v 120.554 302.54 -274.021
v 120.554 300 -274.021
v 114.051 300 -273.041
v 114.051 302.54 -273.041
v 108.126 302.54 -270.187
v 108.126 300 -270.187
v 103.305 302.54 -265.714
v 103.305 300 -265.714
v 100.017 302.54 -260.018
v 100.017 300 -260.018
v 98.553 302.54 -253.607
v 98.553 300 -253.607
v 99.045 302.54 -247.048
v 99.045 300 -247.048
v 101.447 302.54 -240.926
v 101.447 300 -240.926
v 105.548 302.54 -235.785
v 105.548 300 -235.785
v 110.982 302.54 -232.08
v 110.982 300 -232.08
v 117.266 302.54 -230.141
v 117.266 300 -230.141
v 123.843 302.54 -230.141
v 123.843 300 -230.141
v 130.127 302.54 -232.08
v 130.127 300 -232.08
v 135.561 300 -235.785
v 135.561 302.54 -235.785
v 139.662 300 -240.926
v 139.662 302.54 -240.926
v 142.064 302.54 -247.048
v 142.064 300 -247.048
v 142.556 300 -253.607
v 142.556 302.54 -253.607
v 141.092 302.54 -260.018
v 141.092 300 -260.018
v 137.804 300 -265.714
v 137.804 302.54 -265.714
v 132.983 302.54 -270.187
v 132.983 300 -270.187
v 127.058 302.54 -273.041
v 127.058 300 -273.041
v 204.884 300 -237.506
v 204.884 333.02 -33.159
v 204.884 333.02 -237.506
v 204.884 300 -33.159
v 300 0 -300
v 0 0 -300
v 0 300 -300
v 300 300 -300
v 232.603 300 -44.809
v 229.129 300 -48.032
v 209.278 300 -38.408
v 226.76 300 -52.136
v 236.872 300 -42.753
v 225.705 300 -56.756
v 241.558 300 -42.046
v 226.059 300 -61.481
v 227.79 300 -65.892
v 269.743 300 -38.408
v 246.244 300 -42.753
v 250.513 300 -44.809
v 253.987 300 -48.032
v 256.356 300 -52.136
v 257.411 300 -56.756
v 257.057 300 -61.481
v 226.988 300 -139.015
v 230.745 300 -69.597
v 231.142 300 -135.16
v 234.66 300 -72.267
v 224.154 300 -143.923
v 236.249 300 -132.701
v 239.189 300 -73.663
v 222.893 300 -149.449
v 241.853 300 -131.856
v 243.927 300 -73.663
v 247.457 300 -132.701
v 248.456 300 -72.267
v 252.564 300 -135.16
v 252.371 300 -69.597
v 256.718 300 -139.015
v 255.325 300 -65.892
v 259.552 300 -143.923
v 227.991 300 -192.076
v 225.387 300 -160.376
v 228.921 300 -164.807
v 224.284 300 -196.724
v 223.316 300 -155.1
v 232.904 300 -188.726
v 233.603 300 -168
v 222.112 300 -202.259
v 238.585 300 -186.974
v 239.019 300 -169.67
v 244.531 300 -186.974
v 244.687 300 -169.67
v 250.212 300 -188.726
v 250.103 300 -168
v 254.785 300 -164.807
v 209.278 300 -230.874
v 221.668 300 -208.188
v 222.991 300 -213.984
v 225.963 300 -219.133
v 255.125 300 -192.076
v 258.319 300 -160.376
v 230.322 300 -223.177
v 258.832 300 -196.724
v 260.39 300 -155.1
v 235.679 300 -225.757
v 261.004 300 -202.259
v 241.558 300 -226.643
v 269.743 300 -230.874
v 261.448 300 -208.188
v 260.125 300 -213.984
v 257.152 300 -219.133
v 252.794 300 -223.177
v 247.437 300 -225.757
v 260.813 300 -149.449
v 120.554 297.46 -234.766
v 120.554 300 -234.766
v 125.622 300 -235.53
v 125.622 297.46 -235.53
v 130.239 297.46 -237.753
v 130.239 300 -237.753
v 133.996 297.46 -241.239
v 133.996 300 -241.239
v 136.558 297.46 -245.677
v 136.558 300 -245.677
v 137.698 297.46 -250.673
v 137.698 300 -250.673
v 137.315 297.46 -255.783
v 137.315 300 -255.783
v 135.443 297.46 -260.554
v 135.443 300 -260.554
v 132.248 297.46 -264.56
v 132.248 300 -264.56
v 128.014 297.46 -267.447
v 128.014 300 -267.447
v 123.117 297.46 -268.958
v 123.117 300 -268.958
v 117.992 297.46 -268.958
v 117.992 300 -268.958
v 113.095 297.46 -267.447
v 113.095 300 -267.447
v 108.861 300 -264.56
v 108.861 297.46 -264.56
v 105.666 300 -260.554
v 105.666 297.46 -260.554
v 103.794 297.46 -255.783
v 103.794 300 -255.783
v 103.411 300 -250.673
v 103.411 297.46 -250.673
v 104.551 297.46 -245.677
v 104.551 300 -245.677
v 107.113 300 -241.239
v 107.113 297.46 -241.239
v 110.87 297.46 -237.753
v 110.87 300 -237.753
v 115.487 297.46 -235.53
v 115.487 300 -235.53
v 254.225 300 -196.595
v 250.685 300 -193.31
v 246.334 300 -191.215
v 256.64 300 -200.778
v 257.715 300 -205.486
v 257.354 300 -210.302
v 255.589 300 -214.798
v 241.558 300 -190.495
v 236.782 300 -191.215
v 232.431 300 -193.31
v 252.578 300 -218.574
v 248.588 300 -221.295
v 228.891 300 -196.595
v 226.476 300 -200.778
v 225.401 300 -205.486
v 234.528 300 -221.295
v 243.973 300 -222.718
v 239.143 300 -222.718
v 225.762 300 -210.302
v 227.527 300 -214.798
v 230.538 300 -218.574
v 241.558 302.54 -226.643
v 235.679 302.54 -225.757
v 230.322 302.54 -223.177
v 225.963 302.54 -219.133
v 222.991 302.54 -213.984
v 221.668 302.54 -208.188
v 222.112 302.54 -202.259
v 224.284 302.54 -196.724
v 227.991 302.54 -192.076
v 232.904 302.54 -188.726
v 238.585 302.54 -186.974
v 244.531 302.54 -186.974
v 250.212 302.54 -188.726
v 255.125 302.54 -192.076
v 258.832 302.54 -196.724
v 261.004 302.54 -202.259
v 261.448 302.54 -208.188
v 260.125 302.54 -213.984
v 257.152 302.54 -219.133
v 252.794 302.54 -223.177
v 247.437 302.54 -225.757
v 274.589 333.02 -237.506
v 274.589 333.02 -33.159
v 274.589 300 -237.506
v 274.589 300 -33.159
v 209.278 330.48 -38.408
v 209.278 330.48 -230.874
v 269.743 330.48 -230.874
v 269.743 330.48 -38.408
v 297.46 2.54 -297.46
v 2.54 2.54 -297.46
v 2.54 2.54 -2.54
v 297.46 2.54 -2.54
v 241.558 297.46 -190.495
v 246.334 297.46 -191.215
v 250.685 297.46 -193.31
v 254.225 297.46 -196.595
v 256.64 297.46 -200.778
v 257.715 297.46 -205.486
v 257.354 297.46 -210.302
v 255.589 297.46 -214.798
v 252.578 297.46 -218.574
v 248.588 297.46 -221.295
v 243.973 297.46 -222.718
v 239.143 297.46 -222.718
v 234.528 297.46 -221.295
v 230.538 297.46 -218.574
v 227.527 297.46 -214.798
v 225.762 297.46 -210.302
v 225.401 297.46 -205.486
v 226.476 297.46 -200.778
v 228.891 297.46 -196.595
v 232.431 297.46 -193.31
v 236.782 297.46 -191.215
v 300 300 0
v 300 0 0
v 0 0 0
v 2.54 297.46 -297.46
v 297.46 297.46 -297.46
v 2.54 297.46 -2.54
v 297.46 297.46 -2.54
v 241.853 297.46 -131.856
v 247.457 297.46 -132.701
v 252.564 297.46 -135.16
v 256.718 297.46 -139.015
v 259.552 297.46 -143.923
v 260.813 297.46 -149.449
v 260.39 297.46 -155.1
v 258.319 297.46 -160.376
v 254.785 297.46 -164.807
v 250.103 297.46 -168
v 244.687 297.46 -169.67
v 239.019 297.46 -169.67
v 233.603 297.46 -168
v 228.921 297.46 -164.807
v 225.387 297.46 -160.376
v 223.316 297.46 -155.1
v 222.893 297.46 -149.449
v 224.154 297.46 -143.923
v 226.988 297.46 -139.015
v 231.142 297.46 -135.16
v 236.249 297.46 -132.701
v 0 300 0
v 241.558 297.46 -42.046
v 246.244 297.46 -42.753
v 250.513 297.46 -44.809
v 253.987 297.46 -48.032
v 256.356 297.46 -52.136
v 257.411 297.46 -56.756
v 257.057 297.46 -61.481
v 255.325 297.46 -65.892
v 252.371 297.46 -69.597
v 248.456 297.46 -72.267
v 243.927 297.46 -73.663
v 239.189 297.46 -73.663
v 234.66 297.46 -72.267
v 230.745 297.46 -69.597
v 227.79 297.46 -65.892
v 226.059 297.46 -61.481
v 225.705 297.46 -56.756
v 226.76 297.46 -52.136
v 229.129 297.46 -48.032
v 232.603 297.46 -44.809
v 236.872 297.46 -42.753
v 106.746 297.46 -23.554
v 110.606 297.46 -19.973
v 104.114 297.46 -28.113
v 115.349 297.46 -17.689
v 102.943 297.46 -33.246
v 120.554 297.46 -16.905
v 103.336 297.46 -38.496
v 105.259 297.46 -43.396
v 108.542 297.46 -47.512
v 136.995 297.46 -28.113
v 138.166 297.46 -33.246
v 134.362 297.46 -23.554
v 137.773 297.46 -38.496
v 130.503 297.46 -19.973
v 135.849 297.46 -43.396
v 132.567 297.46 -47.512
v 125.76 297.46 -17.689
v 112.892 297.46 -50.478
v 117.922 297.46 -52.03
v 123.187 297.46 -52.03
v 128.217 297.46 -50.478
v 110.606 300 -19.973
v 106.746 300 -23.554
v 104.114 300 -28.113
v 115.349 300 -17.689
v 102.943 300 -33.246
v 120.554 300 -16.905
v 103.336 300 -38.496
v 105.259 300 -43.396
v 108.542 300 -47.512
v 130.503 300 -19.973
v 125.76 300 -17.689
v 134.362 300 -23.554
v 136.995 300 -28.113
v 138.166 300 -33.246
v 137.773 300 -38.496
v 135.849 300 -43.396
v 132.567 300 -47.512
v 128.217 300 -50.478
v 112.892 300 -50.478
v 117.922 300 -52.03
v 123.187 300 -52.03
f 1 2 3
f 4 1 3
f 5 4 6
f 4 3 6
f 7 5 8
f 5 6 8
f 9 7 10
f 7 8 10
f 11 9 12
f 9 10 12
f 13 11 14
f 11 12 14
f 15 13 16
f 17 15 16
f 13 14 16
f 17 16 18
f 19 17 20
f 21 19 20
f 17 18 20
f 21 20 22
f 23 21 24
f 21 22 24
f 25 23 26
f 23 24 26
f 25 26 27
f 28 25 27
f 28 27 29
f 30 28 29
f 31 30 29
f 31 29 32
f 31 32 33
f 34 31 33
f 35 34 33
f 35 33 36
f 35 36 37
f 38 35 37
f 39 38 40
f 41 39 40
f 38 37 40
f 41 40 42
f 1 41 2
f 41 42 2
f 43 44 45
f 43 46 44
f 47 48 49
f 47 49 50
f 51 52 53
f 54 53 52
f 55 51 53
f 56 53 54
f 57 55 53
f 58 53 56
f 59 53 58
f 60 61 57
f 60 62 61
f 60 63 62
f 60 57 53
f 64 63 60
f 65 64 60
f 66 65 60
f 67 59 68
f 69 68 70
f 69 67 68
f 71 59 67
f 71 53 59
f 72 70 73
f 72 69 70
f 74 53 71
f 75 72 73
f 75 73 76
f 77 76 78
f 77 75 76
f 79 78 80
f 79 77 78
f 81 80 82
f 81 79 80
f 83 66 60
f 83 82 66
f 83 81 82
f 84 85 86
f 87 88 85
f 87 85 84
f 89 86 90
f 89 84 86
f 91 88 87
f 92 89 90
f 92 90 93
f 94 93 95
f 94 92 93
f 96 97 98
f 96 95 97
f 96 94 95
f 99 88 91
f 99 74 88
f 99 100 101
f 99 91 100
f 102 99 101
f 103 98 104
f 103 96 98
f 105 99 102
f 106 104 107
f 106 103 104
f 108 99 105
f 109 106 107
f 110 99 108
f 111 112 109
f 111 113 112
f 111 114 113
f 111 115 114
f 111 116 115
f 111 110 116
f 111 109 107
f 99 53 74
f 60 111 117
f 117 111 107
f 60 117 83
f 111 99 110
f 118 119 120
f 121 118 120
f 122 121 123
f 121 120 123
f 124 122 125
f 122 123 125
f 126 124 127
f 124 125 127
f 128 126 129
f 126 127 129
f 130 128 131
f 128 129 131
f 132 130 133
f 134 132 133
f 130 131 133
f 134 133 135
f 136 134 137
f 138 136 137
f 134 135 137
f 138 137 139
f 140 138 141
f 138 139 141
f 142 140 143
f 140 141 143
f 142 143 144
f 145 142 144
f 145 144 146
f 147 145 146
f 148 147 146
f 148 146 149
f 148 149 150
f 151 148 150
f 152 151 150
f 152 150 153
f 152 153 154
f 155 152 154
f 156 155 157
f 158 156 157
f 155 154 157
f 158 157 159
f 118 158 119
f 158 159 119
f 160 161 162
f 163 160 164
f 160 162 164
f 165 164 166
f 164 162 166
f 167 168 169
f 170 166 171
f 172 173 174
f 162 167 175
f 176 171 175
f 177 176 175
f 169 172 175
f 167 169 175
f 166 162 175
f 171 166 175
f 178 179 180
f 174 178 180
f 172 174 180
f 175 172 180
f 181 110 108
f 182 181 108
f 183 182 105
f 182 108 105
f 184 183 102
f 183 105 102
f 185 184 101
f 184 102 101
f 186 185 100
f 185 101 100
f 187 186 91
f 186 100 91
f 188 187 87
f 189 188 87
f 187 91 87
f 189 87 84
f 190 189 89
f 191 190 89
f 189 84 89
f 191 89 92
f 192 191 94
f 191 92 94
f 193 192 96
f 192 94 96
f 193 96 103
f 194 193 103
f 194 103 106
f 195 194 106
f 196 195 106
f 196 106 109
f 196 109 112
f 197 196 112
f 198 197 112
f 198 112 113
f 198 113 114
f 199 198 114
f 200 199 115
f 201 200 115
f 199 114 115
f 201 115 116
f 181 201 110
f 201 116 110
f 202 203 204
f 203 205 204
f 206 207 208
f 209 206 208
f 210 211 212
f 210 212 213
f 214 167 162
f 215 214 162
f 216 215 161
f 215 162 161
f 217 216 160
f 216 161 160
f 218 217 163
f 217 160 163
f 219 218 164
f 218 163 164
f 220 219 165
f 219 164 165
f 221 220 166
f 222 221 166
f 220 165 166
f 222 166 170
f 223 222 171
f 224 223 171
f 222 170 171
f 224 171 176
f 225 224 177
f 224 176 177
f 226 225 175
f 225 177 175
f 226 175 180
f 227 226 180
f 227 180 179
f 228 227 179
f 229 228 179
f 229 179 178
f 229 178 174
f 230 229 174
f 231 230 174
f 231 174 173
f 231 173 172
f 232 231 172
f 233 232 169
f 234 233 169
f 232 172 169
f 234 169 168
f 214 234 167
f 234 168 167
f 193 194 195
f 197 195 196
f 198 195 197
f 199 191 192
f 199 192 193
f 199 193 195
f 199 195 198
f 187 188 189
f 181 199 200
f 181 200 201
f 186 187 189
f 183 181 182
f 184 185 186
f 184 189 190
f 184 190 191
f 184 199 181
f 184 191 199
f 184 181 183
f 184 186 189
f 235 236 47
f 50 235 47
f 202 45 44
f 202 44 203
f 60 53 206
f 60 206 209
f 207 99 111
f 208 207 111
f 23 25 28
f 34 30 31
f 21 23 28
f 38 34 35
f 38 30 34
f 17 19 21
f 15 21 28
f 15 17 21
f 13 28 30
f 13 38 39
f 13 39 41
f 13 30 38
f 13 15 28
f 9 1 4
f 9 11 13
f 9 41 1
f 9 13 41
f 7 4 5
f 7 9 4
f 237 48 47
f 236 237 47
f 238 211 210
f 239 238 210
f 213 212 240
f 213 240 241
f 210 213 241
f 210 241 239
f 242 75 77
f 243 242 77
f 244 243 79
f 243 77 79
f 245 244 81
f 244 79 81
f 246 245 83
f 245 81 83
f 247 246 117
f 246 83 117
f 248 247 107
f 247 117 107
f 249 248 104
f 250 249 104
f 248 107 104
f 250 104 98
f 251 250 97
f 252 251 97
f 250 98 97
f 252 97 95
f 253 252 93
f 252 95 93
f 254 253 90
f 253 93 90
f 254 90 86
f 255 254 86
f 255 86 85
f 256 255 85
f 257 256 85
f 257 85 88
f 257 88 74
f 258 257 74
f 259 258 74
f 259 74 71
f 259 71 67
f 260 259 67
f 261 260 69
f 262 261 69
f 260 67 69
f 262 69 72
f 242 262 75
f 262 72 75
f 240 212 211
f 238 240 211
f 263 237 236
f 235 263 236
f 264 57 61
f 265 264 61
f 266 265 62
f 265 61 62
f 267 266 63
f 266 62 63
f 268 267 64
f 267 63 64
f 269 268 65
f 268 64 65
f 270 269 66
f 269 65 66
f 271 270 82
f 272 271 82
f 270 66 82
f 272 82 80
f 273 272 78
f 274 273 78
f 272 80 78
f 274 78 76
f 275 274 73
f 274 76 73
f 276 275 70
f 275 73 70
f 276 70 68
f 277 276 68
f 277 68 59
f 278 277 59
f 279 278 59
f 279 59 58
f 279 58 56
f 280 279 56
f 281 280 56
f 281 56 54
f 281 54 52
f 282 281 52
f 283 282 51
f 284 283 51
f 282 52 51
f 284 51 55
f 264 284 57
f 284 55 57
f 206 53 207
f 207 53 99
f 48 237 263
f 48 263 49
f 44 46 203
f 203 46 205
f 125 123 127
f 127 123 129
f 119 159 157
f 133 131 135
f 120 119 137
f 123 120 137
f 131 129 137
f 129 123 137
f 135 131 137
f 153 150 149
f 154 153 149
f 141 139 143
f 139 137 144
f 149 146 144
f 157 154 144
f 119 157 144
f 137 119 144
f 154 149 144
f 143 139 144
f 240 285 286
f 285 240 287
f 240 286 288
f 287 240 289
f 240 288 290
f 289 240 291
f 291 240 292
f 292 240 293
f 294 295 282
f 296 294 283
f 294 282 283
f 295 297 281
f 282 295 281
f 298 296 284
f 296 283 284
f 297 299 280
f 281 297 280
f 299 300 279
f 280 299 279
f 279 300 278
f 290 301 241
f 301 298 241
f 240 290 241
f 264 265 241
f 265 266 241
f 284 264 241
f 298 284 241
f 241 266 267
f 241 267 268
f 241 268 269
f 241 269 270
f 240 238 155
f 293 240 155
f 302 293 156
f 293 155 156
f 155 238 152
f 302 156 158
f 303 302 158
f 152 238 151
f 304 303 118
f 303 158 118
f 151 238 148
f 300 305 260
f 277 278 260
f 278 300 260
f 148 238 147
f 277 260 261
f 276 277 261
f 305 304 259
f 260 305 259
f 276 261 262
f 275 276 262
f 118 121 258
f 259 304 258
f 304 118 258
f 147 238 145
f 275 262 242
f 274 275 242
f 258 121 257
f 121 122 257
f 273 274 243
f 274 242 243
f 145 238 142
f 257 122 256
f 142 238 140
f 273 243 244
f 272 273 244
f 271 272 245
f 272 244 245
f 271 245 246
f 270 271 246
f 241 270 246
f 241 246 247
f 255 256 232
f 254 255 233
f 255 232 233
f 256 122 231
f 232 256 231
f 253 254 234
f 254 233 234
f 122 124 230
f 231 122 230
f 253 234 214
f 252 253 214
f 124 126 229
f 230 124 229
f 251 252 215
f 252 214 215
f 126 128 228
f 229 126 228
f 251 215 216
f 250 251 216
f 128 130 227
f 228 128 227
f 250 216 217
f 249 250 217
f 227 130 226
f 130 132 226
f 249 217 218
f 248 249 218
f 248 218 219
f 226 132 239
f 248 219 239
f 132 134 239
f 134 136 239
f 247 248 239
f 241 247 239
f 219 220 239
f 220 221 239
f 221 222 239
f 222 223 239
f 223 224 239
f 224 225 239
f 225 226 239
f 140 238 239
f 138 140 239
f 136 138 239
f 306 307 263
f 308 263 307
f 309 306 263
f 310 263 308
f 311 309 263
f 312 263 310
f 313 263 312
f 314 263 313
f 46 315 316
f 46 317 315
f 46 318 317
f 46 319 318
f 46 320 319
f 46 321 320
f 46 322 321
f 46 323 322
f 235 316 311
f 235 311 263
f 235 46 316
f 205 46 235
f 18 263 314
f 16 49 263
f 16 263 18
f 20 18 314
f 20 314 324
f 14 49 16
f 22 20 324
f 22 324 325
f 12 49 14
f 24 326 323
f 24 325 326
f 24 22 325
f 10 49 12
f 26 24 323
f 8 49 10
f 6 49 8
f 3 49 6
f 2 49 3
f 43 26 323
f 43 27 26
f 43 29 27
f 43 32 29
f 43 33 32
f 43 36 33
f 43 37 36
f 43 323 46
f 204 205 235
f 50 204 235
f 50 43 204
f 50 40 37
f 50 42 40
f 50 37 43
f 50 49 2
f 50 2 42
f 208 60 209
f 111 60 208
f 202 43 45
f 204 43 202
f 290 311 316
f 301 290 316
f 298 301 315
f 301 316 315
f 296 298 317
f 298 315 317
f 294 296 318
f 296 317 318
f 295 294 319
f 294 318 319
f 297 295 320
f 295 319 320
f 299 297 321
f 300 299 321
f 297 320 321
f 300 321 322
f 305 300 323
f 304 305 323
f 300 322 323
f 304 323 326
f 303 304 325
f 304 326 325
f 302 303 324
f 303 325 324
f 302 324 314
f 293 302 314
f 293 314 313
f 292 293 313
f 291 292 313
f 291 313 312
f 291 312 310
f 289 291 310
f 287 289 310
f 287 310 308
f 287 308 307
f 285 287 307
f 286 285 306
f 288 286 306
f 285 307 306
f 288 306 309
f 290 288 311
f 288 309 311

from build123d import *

# Parameters (mm, degrees)
SKETCH1_W           = 300
SKETCH1_H           = 300
BOSS_EXTRUDE1_DEPTH = 300
SHELL1_T            = -2.54
SKETCH2_W           = 300
SKETCH2_H           = 300
BOSS_EXTRUDE2_DEPTH = 2.54
SKETCH3_R           = 15.897271206
SKETCH3_R_2         = 16.201962057
SKETCH3_R_3         = 17.191821314
SKETCH3_R_4         = 17.661116969
CUT_EXTRUDE1_DEPTH  = 2.54
SKETCH4_R           = 22.06299853
SKETCH4_R_2         = 19.946075444
BOSS_EXTRUDE3_DEPTH = 2.54
SKETCH5_R           = 19.013382907
CUT_EXTRUDE2_DEPTH  = 2.54
SKETCH6_W           = 69.704124702
SKETCH6_H           = 204.3475123
SKETCH6_W_2         = 60.465312628
SKETCH6_H_2         = 192.466149128
BOSS_EXTRUDE4_DEPTH = 30.48
SKETCH7_W           = 69.704124702
SKETCH7_H           = 204.3475123
BOSS_EXTRUDE5_DEPTH = 2.54


with BuildPart() as part:
    # Sketch1 → Boss-Extrude1 (new body)
    with BuildSketch(Plane(origin=(0, 0, 0), x_dir=(1, 0, 0), z_dir=(0, 1, 0))):
        with Locations((150, 150)):
            Rectangle(SKETCH1_W, SKETCH1_H)
    extrude(amount=BOSS_EXTRUDE1_DEPTH)

    # Shell1
    shell1_openings = [part.faces().sort_by_distance(p)[0] for p in [
        (150, 300, -150),
    ]]
    offset(amount=SHELL1_T, openings=shell1_openings, kind=Kind.INTERSECTION)

    # Sketch2 → Boss-Extrude2 (add)
    with BuildSketch(Plane(origin=(0, 300, 0), x_dir=(1, 0, 0), z_dir=(0, 1, 0))):
        with Locations((150, 150)):
            Rectangle(SKETCH2_W, SKETCH2_H)
    extrude(amount=-BOSS_EXTRUDE2_DEPTH)

    # Sketch3 → Cut-Extrude1 (cut)
    with BuildSketch(Plane(origin=(0, 300, 0), x_dir=(1, 0, 0), z_dir=(0, 1, 0))):
        with Locations(Location((241.55793996, 57.94356866, 0), (0, 0, 270))):
            Circle(SKETCH3_R)
        with Locations(Location((241.55793996, 206.697112563, 0), (0, 0, 270))):
            Circle(SKETCH3_R_2)
        with Locations(Location((120.554438902, 251.95787292, 0), (0, 0, 270))):
            Circle(SKETCH3_R_3)
        with Locations(Location((120.554438902, 34.565752922, 0), (0, 0, 270))):
            Circle(SKETCH3_R_4)
    extrude(amount=-CUT_EXTRUDE1_DEPTH, mode=Mode.SUBTRACT)

    # Sketch4 → Boss-Extrude3 (add)
    with BuildSketch(Plane(origin=(0, 300, 0), x_dir=(1, 0, 0), z_dir=(0, 1, 0))):
        with Locations(Location((120.554438902, 251.95787292, 0), (0, 0, 90))):
            Circle(SKETCH4_R)
        with Locations(Location((241.55793996, 206.697112563, 0), (0, 0, 90))):
            Circle(SKETCH4_R_2)
    extrude(amount=BOSS_EXTRUDE3_DEPTH)

    # Sketch5 → Cut-Extrude2 (cut)
    with BuildSketch(Plane(origin=(0, 300, 0), x_dir=(1, 0, 0), z_dir=(0, 1, 0))):
        with Locations(Location((241.852973127, 150.869372117, 0), (0, 0, 270))):
            Circle(SKETCH5_R)
    extrude(amount=-CUT_EXTRUDE2_DEPTH, mode=Mode.SUBTRACT)

    # Sketch6 → Boss-Extrude4 (add)
    with BuildSketch(Plane(origin=(0, 300, 0), x_dir=(1, 0, 0), z_dir=(0, 1, 0))):
        with Locations((239.736552446, 135.332520717)):
            Rectangle(SKETCH6_W, SKETCH6_H)
        with Locations((239.510491416, 134.641215144)):
            Rectangle(SKETCH6_W_2, SKETCH6_H_2, mode=Mode.SUBTRACT)
    extrude(amount=BOSS_EXTRUDE4_DEPTH)

    # Sketch7 → Boss-Extrude5 (add)
    with BuildSketch(Plane(origin=(0, 330.48, 0), x_dir=(1, 0, 0), z_dir=(0, 1, 0))):
        with Locations((239.736552446, 135.332520717)):
            Rectangle(SKETCH7_W, SKETCH7_H)
    extrude(amount=BOSS_EXTRUDE5_DEPTH)


solid = part.part
